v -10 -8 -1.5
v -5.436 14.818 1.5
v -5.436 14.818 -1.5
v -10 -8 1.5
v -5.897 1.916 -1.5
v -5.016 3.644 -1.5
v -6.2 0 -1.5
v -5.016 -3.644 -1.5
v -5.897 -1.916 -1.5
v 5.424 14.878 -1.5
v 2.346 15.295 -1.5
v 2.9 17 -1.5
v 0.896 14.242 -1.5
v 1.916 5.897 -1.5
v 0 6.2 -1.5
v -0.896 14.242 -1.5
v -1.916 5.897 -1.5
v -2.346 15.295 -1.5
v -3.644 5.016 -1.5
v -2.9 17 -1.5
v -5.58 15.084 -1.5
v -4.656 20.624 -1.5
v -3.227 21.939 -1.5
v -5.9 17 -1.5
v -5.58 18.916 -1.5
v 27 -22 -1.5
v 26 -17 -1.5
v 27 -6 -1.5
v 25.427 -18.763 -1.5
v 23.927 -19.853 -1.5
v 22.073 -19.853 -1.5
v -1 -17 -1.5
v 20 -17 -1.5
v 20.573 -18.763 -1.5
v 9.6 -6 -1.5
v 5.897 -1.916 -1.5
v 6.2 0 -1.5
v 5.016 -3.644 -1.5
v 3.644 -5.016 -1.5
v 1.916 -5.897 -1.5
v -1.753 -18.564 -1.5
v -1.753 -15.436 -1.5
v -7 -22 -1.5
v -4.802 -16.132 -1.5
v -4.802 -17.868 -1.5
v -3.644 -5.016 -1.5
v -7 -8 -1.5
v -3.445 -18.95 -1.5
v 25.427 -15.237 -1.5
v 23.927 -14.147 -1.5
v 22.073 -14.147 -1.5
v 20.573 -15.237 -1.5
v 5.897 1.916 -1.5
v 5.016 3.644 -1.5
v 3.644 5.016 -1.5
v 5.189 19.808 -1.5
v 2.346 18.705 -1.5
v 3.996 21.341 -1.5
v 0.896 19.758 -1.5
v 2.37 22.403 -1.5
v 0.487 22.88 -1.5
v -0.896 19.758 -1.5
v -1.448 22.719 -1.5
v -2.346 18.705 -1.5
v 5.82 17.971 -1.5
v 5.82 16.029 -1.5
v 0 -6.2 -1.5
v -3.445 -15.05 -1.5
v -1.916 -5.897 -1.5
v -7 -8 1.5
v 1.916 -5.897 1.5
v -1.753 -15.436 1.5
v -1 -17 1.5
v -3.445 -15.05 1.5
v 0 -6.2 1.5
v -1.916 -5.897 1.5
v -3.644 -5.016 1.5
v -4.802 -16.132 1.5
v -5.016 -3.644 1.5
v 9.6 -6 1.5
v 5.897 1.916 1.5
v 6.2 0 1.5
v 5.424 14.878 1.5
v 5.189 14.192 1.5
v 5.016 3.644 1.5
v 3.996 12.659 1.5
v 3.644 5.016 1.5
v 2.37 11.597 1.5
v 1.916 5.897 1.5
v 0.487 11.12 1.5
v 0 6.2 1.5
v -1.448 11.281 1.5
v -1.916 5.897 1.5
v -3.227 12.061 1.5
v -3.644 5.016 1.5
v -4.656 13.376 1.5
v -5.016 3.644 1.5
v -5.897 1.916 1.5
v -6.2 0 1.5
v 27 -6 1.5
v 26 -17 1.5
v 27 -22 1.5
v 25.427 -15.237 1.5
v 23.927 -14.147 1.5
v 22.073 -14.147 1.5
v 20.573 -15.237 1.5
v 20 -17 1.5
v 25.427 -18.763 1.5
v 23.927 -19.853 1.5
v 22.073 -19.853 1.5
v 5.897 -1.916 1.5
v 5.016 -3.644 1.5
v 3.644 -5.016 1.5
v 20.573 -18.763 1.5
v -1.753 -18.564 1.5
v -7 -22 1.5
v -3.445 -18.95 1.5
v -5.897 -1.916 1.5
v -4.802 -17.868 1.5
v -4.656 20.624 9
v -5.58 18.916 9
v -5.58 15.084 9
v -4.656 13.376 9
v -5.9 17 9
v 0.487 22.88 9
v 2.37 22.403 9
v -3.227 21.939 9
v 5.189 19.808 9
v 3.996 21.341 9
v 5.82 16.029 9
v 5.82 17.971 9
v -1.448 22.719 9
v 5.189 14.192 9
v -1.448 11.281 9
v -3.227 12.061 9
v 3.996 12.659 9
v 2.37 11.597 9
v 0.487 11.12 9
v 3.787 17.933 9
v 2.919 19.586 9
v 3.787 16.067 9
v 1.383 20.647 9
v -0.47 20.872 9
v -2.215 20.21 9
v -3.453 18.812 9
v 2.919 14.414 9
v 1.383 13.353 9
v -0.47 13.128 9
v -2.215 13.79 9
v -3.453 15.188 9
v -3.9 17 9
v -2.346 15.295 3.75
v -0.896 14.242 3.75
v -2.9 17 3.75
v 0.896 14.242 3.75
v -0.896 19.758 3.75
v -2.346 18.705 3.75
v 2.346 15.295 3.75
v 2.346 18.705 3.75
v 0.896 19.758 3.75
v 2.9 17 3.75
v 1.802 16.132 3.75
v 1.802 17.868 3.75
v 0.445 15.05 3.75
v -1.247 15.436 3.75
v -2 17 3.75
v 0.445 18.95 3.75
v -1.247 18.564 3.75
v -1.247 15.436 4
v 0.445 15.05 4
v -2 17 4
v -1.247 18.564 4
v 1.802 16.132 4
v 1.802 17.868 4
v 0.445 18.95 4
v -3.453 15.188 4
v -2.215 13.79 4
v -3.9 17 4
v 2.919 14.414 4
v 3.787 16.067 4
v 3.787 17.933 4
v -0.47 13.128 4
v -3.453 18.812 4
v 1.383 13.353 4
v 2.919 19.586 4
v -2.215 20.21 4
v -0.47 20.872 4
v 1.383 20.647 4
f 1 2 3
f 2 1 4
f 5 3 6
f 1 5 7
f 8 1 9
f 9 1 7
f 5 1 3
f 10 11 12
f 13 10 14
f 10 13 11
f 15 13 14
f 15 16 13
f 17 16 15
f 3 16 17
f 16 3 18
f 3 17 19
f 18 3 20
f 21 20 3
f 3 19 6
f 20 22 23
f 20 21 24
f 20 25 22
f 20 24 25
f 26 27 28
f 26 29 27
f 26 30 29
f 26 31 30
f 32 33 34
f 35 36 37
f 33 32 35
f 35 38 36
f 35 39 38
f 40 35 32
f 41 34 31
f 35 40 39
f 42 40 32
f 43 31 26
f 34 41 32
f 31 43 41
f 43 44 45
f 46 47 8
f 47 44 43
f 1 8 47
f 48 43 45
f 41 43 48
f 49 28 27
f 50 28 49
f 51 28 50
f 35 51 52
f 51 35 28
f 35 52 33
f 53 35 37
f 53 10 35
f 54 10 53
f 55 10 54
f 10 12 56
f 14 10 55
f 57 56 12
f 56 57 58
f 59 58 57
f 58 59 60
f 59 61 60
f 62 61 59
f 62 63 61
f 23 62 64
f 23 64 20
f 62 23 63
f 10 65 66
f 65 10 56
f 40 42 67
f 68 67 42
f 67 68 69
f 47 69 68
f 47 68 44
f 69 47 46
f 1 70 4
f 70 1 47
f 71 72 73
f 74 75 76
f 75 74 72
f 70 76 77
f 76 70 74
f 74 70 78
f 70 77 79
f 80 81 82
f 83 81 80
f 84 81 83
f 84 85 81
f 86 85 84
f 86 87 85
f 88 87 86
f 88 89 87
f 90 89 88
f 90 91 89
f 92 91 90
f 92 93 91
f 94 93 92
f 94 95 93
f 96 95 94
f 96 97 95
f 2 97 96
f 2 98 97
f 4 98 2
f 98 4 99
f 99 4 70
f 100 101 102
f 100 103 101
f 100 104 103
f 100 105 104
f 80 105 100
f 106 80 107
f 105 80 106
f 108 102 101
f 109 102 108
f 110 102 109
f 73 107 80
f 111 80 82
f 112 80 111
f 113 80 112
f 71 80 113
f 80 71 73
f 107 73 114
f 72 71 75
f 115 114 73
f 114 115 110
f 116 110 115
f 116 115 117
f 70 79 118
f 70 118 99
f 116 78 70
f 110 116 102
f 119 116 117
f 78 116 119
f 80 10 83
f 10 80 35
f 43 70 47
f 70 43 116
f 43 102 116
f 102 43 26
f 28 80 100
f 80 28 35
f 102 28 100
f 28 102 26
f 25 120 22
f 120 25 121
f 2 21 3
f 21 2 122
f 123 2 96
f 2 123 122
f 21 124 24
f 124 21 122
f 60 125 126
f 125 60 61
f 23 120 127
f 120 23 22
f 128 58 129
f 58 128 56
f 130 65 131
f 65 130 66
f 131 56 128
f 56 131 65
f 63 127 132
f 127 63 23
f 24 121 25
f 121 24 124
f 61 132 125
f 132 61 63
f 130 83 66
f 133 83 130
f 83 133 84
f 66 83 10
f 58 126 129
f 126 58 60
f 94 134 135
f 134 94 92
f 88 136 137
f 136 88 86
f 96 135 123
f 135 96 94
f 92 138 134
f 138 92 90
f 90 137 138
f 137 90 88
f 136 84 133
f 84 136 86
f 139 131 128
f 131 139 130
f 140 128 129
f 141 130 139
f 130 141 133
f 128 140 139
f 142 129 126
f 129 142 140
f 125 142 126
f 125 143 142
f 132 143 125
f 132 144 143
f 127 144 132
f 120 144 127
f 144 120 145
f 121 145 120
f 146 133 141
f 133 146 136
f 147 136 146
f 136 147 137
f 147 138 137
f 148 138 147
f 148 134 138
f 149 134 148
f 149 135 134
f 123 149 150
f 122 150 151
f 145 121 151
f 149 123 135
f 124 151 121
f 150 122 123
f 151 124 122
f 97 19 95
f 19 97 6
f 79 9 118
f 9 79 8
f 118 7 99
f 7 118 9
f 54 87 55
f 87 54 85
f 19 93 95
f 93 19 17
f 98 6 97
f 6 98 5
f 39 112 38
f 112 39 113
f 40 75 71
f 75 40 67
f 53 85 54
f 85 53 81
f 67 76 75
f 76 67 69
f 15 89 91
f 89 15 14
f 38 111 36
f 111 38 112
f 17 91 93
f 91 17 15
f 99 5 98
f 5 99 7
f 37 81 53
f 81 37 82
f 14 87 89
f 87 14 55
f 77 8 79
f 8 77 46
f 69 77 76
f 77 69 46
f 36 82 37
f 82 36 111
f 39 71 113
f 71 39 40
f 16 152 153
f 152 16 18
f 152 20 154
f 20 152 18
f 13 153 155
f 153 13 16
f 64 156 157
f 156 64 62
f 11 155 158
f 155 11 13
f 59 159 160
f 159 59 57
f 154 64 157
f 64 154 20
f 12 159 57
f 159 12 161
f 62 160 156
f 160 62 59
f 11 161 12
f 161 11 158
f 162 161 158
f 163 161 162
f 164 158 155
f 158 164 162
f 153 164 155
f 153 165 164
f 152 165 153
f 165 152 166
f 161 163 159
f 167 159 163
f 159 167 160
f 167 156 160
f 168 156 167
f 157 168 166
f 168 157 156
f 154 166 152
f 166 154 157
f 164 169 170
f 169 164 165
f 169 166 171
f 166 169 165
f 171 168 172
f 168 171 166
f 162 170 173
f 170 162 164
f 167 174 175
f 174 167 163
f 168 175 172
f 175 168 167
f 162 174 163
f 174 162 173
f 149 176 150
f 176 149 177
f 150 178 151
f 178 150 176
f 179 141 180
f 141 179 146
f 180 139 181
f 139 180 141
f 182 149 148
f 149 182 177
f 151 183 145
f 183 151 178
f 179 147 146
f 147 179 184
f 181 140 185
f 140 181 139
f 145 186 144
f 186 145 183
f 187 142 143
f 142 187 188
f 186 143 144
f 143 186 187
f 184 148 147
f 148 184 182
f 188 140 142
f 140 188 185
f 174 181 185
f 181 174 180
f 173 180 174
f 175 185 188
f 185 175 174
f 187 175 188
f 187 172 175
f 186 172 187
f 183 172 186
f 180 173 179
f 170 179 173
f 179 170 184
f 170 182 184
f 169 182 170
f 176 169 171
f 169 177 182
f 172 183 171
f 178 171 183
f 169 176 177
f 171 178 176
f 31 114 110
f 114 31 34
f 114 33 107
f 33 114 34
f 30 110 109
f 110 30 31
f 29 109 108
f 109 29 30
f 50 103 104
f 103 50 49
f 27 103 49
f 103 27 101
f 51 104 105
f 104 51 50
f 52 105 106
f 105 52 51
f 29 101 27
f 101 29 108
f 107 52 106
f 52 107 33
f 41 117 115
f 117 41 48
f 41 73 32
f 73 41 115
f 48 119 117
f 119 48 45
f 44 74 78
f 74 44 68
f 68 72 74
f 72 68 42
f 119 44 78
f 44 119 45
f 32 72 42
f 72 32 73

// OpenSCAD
module side(bearingholesize, gearholesize, sidesize) {
  rotate([0,0,180])difference() {
    union() {
        translate([10,sidesize/2,0]) rotate([90,0,0])linear_extrude(height=sidesize) polygon(points=[[-5,-8], [5,-8],[10,17], [-10,17]],sides=[[0,1,2,3]]);
        translate([0,0,23])  cube([34,sidesize,16],true);
        translate([10,0,-8]) rotate([90,0,0]) cylinder(sidesize ,gearholesize+3,gearholesize+3,true);
        //cube([34,4,34],true);
        //translate([10,1,9]) rotate([90,0,0])cylinder(sidesize,bearingholesize+1,bearingholesize+1,true);
     translate([10,-1.5,-8]) rotate([90,0,0])  cylinder(7.5,gearholesize+3,gearholesize+3);
    }
    //translate([-7,0,-7]) cube([20,sidesize + 2,20],true);
    translate([10,0,9]) rotate([90,0,0]) cylinder(sidesize+5,bearingholesize,bearingholesize,true);

    translate([10,0,-8]) rotate([90,0,0]) cylinder(sidesize+2,gearholesize,gearholesize,true);
//    translate([10,-1,-8]) rotate([90,0,0]) cylinder(sidesize,gearholesize-1,gearholesize-1,true);
    translate([10,-3,-8]) rotate([90,0,0]) cylinder(sidesize/2,gearholesize,gearholesize,true);
    translate([10,-7,-8]) rotate([90,0,0]) cylinder(12,2,2,true);
    translate([10,-7,-8]) rotate([90,0,0]) cylinder(6,gearholesize+1,gearholesize+1,true);
    translate([-13,0,26]) rotate([90,0,0]) cylinder(32,3,3,true);
  }
}
//rotate([90,0,0]) side();


module drawArm() {
    
    translate([10,0,-9])difference() {
        union() {
            side(6.2,2.9,3);
            //translate([0,10,0]) side(7,2.5,2);
            //translate([-10,5,23])  cube([15,10,16],true);
        }
        translate([-13,0,26]) rotate([90,0,0]) cylinder(32,2,2,true);
    }
}
rotate([90,0,0])drawArm();
